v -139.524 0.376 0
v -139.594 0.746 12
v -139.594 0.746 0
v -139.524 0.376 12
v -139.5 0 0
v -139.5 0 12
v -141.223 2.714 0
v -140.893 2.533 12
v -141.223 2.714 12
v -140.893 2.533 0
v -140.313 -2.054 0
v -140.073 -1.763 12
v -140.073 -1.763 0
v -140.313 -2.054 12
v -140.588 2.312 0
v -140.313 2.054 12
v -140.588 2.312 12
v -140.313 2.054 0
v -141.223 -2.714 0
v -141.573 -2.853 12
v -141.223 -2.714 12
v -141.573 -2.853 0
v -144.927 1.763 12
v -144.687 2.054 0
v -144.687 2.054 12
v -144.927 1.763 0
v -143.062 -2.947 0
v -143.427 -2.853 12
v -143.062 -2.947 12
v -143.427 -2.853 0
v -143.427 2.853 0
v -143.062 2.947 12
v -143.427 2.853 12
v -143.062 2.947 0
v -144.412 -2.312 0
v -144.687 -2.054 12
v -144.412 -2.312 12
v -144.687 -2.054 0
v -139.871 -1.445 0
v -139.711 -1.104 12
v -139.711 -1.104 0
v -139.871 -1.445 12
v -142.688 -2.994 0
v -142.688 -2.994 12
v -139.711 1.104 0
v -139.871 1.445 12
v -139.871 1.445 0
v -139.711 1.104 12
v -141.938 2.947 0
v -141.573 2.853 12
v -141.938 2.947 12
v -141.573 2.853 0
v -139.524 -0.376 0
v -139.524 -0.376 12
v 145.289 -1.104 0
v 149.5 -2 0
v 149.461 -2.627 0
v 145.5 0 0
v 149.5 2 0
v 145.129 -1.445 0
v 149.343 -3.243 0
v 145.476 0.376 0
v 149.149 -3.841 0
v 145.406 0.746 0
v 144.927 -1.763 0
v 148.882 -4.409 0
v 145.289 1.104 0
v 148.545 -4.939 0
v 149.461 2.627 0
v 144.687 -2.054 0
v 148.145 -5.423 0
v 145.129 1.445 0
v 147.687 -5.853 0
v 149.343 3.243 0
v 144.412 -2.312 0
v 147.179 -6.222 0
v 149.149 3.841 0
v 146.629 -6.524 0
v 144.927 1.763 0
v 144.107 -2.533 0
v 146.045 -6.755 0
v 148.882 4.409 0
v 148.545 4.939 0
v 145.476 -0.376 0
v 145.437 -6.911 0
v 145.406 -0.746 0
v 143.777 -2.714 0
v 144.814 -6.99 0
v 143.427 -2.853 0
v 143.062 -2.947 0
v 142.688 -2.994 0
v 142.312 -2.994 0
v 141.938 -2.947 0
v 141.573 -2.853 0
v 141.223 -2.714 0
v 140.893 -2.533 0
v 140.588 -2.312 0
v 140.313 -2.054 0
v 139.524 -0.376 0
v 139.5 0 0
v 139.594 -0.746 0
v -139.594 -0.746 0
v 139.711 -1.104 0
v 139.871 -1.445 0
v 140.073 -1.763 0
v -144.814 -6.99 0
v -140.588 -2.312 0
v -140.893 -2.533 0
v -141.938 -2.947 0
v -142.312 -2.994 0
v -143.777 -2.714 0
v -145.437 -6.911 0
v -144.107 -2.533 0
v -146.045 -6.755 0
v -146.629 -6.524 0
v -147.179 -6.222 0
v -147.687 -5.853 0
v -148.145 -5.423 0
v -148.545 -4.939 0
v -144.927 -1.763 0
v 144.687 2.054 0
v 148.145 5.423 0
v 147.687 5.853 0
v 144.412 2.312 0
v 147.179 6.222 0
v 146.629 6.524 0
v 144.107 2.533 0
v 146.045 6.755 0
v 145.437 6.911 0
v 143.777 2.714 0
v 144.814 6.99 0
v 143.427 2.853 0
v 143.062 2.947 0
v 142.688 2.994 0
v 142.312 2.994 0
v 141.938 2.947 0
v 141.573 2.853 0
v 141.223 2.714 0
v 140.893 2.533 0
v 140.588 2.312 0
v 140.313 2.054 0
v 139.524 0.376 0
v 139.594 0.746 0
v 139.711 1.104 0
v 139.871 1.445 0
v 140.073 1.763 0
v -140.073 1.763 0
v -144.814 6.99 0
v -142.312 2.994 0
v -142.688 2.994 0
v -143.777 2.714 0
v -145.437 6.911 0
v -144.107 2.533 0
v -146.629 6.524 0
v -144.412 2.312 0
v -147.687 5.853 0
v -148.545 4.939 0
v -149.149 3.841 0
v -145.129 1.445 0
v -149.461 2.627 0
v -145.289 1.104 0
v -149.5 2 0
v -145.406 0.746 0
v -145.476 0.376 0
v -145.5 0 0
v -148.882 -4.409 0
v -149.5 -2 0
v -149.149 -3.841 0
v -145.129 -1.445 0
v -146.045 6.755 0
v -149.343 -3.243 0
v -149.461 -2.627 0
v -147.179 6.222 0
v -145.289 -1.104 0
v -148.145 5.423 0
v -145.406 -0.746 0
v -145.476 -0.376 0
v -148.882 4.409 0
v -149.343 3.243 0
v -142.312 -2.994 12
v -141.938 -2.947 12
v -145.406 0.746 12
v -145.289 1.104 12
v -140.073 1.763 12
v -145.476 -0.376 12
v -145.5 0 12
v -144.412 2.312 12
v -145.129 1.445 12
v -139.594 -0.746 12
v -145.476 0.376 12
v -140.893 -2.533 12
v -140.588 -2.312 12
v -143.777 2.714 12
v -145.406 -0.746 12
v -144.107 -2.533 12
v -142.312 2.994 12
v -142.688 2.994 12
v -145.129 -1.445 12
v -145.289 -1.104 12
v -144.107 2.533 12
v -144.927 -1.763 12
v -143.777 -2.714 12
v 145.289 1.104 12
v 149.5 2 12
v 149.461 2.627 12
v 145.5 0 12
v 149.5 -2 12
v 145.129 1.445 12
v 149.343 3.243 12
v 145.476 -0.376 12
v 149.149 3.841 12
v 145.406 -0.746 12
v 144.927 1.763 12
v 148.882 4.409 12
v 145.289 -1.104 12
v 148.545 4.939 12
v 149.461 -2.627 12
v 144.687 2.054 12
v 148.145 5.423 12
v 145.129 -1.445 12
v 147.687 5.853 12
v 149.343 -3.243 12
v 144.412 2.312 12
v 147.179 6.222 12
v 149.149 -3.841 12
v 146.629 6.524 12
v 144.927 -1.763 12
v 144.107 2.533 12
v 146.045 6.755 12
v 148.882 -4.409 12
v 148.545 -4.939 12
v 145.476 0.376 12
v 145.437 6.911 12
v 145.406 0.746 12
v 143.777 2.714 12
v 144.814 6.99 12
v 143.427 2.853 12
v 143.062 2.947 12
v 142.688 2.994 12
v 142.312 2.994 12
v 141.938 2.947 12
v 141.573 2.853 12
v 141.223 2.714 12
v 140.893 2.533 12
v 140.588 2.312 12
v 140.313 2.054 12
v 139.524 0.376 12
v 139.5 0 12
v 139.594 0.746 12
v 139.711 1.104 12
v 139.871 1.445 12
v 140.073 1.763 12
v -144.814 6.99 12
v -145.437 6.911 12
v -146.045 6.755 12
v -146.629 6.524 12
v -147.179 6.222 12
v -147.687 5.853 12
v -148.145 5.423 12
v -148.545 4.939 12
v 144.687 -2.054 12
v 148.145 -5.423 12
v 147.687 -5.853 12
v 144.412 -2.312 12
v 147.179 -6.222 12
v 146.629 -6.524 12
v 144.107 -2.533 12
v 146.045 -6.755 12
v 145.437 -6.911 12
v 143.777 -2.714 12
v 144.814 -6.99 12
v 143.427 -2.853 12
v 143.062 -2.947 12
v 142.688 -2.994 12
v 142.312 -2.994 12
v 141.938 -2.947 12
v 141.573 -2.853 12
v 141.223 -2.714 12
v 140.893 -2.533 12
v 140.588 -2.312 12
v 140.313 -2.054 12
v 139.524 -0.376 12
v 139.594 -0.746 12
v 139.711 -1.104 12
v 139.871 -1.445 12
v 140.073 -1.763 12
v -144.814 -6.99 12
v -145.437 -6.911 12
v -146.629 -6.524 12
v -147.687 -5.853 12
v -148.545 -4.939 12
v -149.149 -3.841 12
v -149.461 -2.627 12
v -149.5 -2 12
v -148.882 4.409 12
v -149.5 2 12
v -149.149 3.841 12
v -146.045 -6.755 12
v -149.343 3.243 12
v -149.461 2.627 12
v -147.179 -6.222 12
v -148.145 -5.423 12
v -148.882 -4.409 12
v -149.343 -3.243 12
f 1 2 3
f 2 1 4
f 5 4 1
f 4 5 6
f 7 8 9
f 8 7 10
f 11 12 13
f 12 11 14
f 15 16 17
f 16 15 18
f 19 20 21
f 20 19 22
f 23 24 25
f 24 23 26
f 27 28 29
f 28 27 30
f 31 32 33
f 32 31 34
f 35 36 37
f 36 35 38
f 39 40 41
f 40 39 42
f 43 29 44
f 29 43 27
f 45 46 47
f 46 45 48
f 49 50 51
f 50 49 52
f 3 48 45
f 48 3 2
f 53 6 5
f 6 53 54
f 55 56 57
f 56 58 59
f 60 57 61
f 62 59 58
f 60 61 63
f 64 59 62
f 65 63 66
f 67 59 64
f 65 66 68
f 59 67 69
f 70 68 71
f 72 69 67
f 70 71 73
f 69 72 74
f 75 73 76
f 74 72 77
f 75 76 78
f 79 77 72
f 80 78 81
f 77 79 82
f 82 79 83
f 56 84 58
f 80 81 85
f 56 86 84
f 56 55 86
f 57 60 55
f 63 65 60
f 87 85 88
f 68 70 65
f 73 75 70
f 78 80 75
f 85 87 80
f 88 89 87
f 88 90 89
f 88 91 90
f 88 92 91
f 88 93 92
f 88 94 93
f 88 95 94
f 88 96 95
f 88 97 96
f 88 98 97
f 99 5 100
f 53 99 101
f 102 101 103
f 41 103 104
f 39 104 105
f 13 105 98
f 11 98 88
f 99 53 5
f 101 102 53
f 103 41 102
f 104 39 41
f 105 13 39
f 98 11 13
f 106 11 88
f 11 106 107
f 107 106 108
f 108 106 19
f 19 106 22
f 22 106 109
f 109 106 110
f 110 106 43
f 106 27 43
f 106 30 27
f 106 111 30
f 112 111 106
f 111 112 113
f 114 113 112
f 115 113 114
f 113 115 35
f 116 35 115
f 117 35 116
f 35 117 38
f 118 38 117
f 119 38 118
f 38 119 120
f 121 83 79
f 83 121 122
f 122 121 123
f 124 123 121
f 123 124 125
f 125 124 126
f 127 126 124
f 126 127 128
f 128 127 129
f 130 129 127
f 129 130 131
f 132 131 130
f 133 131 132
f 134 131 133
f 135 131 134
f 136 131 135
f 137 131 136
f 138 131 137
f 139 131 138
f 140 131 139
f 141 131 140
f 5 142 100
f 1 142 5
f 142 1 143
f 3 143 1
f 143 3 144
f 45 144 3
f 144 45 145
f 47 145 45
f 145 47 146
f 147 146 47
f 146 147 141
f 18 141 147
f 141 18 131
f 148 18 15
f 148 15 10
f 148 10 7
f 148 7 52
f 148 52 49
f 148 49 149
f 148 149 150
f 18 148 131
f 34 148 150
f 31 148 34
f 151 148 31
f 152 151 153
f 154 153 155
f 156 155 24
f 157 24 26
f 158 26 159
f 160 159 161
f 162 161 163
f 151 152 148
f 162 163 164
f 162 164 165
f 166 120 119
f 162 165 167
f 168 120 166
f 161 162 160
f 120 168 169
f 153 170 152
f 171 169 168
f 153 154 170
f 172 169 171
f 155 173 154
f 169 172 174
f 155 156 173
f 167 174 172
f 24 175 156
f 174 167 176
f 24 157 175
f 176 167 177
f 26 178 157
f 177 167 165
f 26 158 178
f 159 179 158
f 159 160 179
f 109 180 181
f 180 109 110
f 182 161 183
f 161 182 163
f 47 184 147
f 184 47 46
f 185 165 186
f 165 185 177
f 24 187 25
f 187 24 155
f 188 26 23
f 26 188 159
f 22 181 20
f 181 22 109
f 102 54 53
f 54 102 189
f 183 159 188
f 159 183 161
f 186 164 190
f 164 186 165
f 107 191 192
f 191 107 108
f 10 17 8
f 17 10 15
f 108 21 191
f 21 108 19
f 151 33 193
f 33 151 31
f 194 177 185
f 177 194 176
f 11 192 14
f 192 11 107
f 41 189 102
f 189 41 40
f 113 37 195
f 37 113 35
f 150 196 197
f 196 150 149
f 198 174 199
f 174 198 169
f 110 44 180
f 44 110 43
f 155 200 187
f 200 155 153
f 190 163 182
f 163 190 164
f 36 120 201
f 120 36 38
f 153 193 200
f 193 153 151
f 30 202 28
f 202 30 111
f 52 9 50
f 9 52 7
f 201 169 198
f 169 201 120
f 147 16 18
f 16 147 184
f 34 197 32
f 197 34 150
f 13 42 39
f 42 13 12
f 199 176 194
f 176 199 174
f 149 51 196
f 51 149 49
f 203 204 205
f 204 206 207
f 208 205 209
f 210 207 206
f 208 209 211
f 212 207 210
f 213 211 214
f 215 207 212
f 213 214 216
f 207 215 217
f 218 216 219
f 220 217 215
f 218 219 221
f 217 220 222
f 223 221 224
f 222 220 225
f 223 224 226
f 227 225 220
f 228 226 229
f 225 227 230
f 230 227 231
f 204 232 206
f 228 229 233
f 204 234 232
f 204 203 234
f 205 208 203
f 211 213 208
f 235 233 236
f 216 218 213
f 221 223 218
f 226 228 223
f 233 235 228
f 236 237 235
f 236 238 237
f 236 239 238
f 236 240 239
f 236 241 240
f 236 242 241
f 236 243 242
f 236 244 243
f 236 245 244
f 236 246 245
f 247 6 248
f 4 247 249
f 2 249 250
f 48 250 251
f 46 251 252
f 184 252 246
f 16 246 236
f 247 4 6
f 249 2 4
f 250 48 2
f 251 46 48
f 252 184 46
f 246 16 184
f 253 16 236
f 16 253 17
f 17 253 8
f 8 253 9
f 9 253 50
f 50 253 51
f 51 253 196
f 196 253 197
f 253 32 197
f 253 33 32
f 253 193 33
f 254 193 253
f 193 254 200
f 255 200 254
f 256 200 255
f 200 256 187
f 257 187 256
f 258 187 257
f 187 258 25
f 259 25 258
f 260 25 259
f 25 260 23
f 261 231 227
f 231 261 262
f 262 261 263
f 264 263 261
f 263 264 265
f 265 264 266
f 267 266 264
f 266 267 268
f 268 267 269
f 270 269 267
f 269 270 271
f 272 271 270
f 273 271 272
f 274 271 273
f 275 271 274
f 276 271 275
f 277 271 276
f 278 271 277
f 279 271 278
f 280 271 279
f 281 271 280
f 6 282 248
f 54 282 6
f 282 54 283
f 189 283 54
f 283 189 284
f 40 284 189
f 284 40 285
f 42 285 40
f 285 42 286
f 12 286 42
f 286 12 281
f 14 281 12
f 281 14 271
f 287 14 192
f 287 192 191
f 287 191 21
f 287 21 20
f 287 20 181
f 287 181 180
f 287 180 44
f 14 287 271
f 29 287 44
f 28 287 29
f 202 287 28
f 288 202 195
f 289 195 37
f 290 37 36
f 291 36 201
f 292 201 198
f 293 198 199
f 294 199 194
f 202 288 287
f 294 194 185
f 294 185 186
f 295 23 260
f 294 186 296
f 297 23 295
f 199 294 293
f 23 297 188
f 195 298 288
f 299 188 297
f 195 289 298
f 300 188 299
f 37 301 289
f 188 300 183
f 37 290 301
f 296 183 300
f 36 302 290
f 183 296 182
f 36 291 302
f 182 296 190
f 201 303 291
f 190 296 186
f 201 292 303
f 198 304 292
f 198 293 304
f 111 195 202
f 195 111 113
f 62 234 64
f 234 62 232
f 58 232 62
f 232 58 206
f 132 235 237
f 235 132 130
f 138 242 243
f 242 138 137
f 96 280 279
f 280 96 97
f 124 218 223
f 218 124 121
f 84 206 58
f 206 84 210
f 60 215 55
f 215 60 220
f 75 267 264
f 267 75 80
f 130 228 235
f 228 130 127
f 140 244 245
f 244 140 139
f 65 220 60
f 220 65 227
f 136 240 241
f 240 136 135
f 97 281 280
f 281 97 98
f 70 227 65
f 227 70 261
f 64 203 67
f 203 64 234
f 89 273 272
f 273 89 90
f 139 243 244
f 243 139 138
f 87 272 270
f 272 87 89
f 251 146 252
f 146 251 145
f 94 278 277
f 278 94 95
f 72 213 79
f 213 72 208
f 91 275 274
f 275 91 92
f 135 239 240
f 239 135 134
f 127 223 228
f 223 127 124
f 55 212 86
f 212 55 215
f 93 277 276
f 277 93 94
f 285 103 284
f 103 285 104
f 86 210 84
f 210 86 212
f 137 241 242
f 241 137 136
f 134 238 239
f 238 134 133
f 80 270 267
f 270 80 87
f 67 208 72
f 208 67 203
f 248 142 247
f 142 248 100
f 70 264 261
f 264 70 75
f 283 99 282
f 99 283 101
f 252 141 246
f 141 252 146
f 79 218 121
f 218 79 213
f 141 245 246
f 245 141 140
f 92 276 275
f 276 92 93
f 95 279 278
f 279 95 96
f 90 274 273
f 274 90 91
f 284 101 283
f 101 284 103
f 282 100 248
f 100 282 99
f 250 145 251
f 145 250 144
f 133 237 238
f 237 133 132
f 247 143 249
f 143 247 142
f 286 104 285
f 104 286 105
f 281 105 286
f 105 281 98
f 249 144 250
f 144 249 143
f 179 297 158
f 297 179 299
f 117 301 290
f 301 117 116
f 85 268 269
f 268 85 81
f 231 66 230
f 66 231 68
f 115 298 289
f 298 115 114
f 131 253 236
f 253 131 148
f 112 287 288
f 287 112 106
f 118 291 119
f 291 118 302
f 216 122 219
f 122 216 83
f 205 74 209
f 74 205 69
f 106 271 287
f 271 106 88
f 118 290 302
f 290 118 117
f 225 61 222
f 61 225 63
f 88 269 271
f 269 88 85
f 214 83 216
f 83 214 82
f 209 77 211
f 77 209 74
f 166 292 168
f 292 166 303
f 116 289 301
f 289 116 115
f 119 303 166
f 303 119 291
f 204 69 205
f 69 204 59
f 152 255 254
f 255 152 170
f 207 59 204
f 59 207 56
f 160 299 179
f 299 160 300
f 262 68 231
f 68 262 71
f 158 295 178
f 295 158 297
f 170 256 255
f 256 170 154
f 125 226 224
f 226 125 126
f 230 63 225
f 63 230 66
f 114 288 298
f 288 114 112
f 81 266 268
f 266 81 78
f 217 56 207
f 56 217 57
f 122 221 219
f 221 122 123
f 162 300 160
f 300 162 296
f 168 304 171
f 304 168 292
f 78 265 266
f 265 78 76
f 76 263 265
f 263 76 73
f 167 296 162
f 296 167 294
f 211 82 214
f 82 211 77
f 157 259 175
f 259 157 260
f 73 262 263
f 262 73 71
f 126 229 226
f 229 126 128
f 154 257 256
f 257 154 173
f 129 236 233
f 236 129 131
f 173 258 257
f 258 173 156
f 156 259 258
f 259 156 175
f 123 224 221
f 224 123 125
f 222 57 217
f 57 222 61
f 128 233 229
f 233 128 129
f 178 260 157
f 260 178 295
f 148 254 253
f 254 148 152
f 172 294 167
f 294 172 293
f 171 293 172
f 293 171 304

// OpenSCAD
$fn = 50;


difference() {
	union() {
		hull() {
			translate(v = [-144.5000000000, 2.0000000000, 0]) {
				cylinder(h = 12, r = 5);
			}
			translate(v = [144.5000000000, 2.0000000000, 0]) {
				cylinder(h = 12, r = 5);
			}
			translate(v = [-144.5000000000, -2.0000000000, 0]) {
				cylinder(h = 12, r = 5);
			}
			translate(v = [144.5000000000, -2.0000000000, 0]) {
				cylinder(h = 12, r = 5);
			}
		}
	}
	union() {
		translate(v = [-142.5000000000, 0.0000000000, 0]) {
			cylinder(h = 12, r = 3.0000000000);
		}
		translate(v = [142.5000000000, 0.0000000000, 0]) {
			cylinder(h = 12, r = 3.0000000000);
		}
		translate(v = [-142.5000000000, 0.0000000000, 0]) {
			cylinder(h = 12, r = 1.5000000000);
		}
		translate(v = [142.5000000000, 0.0000000000, 0]) {
			cylinder(h = 12, r = 1.5000000000);
		}
		translate(v = [-142.5000000000, 0.0000000000, 0]) {
			cylinder(h = 12, r = 1.5000000000);
		}
		translate(v = [142.5000000000, 0.0000000000, 0]) {
			cylinder(h = 12, r = 1.5000000000);
		}
		translate(v = [-142.5000000000, 0.0000000000, 0]) {
			cylinder(h = 12, r = 1.5000000000);
		}
		translate(v = [142.5000000000, 0.0000000000, 0]) {
			cylinder(h = 12, r = 1.5000000000);
		}
	}
}
